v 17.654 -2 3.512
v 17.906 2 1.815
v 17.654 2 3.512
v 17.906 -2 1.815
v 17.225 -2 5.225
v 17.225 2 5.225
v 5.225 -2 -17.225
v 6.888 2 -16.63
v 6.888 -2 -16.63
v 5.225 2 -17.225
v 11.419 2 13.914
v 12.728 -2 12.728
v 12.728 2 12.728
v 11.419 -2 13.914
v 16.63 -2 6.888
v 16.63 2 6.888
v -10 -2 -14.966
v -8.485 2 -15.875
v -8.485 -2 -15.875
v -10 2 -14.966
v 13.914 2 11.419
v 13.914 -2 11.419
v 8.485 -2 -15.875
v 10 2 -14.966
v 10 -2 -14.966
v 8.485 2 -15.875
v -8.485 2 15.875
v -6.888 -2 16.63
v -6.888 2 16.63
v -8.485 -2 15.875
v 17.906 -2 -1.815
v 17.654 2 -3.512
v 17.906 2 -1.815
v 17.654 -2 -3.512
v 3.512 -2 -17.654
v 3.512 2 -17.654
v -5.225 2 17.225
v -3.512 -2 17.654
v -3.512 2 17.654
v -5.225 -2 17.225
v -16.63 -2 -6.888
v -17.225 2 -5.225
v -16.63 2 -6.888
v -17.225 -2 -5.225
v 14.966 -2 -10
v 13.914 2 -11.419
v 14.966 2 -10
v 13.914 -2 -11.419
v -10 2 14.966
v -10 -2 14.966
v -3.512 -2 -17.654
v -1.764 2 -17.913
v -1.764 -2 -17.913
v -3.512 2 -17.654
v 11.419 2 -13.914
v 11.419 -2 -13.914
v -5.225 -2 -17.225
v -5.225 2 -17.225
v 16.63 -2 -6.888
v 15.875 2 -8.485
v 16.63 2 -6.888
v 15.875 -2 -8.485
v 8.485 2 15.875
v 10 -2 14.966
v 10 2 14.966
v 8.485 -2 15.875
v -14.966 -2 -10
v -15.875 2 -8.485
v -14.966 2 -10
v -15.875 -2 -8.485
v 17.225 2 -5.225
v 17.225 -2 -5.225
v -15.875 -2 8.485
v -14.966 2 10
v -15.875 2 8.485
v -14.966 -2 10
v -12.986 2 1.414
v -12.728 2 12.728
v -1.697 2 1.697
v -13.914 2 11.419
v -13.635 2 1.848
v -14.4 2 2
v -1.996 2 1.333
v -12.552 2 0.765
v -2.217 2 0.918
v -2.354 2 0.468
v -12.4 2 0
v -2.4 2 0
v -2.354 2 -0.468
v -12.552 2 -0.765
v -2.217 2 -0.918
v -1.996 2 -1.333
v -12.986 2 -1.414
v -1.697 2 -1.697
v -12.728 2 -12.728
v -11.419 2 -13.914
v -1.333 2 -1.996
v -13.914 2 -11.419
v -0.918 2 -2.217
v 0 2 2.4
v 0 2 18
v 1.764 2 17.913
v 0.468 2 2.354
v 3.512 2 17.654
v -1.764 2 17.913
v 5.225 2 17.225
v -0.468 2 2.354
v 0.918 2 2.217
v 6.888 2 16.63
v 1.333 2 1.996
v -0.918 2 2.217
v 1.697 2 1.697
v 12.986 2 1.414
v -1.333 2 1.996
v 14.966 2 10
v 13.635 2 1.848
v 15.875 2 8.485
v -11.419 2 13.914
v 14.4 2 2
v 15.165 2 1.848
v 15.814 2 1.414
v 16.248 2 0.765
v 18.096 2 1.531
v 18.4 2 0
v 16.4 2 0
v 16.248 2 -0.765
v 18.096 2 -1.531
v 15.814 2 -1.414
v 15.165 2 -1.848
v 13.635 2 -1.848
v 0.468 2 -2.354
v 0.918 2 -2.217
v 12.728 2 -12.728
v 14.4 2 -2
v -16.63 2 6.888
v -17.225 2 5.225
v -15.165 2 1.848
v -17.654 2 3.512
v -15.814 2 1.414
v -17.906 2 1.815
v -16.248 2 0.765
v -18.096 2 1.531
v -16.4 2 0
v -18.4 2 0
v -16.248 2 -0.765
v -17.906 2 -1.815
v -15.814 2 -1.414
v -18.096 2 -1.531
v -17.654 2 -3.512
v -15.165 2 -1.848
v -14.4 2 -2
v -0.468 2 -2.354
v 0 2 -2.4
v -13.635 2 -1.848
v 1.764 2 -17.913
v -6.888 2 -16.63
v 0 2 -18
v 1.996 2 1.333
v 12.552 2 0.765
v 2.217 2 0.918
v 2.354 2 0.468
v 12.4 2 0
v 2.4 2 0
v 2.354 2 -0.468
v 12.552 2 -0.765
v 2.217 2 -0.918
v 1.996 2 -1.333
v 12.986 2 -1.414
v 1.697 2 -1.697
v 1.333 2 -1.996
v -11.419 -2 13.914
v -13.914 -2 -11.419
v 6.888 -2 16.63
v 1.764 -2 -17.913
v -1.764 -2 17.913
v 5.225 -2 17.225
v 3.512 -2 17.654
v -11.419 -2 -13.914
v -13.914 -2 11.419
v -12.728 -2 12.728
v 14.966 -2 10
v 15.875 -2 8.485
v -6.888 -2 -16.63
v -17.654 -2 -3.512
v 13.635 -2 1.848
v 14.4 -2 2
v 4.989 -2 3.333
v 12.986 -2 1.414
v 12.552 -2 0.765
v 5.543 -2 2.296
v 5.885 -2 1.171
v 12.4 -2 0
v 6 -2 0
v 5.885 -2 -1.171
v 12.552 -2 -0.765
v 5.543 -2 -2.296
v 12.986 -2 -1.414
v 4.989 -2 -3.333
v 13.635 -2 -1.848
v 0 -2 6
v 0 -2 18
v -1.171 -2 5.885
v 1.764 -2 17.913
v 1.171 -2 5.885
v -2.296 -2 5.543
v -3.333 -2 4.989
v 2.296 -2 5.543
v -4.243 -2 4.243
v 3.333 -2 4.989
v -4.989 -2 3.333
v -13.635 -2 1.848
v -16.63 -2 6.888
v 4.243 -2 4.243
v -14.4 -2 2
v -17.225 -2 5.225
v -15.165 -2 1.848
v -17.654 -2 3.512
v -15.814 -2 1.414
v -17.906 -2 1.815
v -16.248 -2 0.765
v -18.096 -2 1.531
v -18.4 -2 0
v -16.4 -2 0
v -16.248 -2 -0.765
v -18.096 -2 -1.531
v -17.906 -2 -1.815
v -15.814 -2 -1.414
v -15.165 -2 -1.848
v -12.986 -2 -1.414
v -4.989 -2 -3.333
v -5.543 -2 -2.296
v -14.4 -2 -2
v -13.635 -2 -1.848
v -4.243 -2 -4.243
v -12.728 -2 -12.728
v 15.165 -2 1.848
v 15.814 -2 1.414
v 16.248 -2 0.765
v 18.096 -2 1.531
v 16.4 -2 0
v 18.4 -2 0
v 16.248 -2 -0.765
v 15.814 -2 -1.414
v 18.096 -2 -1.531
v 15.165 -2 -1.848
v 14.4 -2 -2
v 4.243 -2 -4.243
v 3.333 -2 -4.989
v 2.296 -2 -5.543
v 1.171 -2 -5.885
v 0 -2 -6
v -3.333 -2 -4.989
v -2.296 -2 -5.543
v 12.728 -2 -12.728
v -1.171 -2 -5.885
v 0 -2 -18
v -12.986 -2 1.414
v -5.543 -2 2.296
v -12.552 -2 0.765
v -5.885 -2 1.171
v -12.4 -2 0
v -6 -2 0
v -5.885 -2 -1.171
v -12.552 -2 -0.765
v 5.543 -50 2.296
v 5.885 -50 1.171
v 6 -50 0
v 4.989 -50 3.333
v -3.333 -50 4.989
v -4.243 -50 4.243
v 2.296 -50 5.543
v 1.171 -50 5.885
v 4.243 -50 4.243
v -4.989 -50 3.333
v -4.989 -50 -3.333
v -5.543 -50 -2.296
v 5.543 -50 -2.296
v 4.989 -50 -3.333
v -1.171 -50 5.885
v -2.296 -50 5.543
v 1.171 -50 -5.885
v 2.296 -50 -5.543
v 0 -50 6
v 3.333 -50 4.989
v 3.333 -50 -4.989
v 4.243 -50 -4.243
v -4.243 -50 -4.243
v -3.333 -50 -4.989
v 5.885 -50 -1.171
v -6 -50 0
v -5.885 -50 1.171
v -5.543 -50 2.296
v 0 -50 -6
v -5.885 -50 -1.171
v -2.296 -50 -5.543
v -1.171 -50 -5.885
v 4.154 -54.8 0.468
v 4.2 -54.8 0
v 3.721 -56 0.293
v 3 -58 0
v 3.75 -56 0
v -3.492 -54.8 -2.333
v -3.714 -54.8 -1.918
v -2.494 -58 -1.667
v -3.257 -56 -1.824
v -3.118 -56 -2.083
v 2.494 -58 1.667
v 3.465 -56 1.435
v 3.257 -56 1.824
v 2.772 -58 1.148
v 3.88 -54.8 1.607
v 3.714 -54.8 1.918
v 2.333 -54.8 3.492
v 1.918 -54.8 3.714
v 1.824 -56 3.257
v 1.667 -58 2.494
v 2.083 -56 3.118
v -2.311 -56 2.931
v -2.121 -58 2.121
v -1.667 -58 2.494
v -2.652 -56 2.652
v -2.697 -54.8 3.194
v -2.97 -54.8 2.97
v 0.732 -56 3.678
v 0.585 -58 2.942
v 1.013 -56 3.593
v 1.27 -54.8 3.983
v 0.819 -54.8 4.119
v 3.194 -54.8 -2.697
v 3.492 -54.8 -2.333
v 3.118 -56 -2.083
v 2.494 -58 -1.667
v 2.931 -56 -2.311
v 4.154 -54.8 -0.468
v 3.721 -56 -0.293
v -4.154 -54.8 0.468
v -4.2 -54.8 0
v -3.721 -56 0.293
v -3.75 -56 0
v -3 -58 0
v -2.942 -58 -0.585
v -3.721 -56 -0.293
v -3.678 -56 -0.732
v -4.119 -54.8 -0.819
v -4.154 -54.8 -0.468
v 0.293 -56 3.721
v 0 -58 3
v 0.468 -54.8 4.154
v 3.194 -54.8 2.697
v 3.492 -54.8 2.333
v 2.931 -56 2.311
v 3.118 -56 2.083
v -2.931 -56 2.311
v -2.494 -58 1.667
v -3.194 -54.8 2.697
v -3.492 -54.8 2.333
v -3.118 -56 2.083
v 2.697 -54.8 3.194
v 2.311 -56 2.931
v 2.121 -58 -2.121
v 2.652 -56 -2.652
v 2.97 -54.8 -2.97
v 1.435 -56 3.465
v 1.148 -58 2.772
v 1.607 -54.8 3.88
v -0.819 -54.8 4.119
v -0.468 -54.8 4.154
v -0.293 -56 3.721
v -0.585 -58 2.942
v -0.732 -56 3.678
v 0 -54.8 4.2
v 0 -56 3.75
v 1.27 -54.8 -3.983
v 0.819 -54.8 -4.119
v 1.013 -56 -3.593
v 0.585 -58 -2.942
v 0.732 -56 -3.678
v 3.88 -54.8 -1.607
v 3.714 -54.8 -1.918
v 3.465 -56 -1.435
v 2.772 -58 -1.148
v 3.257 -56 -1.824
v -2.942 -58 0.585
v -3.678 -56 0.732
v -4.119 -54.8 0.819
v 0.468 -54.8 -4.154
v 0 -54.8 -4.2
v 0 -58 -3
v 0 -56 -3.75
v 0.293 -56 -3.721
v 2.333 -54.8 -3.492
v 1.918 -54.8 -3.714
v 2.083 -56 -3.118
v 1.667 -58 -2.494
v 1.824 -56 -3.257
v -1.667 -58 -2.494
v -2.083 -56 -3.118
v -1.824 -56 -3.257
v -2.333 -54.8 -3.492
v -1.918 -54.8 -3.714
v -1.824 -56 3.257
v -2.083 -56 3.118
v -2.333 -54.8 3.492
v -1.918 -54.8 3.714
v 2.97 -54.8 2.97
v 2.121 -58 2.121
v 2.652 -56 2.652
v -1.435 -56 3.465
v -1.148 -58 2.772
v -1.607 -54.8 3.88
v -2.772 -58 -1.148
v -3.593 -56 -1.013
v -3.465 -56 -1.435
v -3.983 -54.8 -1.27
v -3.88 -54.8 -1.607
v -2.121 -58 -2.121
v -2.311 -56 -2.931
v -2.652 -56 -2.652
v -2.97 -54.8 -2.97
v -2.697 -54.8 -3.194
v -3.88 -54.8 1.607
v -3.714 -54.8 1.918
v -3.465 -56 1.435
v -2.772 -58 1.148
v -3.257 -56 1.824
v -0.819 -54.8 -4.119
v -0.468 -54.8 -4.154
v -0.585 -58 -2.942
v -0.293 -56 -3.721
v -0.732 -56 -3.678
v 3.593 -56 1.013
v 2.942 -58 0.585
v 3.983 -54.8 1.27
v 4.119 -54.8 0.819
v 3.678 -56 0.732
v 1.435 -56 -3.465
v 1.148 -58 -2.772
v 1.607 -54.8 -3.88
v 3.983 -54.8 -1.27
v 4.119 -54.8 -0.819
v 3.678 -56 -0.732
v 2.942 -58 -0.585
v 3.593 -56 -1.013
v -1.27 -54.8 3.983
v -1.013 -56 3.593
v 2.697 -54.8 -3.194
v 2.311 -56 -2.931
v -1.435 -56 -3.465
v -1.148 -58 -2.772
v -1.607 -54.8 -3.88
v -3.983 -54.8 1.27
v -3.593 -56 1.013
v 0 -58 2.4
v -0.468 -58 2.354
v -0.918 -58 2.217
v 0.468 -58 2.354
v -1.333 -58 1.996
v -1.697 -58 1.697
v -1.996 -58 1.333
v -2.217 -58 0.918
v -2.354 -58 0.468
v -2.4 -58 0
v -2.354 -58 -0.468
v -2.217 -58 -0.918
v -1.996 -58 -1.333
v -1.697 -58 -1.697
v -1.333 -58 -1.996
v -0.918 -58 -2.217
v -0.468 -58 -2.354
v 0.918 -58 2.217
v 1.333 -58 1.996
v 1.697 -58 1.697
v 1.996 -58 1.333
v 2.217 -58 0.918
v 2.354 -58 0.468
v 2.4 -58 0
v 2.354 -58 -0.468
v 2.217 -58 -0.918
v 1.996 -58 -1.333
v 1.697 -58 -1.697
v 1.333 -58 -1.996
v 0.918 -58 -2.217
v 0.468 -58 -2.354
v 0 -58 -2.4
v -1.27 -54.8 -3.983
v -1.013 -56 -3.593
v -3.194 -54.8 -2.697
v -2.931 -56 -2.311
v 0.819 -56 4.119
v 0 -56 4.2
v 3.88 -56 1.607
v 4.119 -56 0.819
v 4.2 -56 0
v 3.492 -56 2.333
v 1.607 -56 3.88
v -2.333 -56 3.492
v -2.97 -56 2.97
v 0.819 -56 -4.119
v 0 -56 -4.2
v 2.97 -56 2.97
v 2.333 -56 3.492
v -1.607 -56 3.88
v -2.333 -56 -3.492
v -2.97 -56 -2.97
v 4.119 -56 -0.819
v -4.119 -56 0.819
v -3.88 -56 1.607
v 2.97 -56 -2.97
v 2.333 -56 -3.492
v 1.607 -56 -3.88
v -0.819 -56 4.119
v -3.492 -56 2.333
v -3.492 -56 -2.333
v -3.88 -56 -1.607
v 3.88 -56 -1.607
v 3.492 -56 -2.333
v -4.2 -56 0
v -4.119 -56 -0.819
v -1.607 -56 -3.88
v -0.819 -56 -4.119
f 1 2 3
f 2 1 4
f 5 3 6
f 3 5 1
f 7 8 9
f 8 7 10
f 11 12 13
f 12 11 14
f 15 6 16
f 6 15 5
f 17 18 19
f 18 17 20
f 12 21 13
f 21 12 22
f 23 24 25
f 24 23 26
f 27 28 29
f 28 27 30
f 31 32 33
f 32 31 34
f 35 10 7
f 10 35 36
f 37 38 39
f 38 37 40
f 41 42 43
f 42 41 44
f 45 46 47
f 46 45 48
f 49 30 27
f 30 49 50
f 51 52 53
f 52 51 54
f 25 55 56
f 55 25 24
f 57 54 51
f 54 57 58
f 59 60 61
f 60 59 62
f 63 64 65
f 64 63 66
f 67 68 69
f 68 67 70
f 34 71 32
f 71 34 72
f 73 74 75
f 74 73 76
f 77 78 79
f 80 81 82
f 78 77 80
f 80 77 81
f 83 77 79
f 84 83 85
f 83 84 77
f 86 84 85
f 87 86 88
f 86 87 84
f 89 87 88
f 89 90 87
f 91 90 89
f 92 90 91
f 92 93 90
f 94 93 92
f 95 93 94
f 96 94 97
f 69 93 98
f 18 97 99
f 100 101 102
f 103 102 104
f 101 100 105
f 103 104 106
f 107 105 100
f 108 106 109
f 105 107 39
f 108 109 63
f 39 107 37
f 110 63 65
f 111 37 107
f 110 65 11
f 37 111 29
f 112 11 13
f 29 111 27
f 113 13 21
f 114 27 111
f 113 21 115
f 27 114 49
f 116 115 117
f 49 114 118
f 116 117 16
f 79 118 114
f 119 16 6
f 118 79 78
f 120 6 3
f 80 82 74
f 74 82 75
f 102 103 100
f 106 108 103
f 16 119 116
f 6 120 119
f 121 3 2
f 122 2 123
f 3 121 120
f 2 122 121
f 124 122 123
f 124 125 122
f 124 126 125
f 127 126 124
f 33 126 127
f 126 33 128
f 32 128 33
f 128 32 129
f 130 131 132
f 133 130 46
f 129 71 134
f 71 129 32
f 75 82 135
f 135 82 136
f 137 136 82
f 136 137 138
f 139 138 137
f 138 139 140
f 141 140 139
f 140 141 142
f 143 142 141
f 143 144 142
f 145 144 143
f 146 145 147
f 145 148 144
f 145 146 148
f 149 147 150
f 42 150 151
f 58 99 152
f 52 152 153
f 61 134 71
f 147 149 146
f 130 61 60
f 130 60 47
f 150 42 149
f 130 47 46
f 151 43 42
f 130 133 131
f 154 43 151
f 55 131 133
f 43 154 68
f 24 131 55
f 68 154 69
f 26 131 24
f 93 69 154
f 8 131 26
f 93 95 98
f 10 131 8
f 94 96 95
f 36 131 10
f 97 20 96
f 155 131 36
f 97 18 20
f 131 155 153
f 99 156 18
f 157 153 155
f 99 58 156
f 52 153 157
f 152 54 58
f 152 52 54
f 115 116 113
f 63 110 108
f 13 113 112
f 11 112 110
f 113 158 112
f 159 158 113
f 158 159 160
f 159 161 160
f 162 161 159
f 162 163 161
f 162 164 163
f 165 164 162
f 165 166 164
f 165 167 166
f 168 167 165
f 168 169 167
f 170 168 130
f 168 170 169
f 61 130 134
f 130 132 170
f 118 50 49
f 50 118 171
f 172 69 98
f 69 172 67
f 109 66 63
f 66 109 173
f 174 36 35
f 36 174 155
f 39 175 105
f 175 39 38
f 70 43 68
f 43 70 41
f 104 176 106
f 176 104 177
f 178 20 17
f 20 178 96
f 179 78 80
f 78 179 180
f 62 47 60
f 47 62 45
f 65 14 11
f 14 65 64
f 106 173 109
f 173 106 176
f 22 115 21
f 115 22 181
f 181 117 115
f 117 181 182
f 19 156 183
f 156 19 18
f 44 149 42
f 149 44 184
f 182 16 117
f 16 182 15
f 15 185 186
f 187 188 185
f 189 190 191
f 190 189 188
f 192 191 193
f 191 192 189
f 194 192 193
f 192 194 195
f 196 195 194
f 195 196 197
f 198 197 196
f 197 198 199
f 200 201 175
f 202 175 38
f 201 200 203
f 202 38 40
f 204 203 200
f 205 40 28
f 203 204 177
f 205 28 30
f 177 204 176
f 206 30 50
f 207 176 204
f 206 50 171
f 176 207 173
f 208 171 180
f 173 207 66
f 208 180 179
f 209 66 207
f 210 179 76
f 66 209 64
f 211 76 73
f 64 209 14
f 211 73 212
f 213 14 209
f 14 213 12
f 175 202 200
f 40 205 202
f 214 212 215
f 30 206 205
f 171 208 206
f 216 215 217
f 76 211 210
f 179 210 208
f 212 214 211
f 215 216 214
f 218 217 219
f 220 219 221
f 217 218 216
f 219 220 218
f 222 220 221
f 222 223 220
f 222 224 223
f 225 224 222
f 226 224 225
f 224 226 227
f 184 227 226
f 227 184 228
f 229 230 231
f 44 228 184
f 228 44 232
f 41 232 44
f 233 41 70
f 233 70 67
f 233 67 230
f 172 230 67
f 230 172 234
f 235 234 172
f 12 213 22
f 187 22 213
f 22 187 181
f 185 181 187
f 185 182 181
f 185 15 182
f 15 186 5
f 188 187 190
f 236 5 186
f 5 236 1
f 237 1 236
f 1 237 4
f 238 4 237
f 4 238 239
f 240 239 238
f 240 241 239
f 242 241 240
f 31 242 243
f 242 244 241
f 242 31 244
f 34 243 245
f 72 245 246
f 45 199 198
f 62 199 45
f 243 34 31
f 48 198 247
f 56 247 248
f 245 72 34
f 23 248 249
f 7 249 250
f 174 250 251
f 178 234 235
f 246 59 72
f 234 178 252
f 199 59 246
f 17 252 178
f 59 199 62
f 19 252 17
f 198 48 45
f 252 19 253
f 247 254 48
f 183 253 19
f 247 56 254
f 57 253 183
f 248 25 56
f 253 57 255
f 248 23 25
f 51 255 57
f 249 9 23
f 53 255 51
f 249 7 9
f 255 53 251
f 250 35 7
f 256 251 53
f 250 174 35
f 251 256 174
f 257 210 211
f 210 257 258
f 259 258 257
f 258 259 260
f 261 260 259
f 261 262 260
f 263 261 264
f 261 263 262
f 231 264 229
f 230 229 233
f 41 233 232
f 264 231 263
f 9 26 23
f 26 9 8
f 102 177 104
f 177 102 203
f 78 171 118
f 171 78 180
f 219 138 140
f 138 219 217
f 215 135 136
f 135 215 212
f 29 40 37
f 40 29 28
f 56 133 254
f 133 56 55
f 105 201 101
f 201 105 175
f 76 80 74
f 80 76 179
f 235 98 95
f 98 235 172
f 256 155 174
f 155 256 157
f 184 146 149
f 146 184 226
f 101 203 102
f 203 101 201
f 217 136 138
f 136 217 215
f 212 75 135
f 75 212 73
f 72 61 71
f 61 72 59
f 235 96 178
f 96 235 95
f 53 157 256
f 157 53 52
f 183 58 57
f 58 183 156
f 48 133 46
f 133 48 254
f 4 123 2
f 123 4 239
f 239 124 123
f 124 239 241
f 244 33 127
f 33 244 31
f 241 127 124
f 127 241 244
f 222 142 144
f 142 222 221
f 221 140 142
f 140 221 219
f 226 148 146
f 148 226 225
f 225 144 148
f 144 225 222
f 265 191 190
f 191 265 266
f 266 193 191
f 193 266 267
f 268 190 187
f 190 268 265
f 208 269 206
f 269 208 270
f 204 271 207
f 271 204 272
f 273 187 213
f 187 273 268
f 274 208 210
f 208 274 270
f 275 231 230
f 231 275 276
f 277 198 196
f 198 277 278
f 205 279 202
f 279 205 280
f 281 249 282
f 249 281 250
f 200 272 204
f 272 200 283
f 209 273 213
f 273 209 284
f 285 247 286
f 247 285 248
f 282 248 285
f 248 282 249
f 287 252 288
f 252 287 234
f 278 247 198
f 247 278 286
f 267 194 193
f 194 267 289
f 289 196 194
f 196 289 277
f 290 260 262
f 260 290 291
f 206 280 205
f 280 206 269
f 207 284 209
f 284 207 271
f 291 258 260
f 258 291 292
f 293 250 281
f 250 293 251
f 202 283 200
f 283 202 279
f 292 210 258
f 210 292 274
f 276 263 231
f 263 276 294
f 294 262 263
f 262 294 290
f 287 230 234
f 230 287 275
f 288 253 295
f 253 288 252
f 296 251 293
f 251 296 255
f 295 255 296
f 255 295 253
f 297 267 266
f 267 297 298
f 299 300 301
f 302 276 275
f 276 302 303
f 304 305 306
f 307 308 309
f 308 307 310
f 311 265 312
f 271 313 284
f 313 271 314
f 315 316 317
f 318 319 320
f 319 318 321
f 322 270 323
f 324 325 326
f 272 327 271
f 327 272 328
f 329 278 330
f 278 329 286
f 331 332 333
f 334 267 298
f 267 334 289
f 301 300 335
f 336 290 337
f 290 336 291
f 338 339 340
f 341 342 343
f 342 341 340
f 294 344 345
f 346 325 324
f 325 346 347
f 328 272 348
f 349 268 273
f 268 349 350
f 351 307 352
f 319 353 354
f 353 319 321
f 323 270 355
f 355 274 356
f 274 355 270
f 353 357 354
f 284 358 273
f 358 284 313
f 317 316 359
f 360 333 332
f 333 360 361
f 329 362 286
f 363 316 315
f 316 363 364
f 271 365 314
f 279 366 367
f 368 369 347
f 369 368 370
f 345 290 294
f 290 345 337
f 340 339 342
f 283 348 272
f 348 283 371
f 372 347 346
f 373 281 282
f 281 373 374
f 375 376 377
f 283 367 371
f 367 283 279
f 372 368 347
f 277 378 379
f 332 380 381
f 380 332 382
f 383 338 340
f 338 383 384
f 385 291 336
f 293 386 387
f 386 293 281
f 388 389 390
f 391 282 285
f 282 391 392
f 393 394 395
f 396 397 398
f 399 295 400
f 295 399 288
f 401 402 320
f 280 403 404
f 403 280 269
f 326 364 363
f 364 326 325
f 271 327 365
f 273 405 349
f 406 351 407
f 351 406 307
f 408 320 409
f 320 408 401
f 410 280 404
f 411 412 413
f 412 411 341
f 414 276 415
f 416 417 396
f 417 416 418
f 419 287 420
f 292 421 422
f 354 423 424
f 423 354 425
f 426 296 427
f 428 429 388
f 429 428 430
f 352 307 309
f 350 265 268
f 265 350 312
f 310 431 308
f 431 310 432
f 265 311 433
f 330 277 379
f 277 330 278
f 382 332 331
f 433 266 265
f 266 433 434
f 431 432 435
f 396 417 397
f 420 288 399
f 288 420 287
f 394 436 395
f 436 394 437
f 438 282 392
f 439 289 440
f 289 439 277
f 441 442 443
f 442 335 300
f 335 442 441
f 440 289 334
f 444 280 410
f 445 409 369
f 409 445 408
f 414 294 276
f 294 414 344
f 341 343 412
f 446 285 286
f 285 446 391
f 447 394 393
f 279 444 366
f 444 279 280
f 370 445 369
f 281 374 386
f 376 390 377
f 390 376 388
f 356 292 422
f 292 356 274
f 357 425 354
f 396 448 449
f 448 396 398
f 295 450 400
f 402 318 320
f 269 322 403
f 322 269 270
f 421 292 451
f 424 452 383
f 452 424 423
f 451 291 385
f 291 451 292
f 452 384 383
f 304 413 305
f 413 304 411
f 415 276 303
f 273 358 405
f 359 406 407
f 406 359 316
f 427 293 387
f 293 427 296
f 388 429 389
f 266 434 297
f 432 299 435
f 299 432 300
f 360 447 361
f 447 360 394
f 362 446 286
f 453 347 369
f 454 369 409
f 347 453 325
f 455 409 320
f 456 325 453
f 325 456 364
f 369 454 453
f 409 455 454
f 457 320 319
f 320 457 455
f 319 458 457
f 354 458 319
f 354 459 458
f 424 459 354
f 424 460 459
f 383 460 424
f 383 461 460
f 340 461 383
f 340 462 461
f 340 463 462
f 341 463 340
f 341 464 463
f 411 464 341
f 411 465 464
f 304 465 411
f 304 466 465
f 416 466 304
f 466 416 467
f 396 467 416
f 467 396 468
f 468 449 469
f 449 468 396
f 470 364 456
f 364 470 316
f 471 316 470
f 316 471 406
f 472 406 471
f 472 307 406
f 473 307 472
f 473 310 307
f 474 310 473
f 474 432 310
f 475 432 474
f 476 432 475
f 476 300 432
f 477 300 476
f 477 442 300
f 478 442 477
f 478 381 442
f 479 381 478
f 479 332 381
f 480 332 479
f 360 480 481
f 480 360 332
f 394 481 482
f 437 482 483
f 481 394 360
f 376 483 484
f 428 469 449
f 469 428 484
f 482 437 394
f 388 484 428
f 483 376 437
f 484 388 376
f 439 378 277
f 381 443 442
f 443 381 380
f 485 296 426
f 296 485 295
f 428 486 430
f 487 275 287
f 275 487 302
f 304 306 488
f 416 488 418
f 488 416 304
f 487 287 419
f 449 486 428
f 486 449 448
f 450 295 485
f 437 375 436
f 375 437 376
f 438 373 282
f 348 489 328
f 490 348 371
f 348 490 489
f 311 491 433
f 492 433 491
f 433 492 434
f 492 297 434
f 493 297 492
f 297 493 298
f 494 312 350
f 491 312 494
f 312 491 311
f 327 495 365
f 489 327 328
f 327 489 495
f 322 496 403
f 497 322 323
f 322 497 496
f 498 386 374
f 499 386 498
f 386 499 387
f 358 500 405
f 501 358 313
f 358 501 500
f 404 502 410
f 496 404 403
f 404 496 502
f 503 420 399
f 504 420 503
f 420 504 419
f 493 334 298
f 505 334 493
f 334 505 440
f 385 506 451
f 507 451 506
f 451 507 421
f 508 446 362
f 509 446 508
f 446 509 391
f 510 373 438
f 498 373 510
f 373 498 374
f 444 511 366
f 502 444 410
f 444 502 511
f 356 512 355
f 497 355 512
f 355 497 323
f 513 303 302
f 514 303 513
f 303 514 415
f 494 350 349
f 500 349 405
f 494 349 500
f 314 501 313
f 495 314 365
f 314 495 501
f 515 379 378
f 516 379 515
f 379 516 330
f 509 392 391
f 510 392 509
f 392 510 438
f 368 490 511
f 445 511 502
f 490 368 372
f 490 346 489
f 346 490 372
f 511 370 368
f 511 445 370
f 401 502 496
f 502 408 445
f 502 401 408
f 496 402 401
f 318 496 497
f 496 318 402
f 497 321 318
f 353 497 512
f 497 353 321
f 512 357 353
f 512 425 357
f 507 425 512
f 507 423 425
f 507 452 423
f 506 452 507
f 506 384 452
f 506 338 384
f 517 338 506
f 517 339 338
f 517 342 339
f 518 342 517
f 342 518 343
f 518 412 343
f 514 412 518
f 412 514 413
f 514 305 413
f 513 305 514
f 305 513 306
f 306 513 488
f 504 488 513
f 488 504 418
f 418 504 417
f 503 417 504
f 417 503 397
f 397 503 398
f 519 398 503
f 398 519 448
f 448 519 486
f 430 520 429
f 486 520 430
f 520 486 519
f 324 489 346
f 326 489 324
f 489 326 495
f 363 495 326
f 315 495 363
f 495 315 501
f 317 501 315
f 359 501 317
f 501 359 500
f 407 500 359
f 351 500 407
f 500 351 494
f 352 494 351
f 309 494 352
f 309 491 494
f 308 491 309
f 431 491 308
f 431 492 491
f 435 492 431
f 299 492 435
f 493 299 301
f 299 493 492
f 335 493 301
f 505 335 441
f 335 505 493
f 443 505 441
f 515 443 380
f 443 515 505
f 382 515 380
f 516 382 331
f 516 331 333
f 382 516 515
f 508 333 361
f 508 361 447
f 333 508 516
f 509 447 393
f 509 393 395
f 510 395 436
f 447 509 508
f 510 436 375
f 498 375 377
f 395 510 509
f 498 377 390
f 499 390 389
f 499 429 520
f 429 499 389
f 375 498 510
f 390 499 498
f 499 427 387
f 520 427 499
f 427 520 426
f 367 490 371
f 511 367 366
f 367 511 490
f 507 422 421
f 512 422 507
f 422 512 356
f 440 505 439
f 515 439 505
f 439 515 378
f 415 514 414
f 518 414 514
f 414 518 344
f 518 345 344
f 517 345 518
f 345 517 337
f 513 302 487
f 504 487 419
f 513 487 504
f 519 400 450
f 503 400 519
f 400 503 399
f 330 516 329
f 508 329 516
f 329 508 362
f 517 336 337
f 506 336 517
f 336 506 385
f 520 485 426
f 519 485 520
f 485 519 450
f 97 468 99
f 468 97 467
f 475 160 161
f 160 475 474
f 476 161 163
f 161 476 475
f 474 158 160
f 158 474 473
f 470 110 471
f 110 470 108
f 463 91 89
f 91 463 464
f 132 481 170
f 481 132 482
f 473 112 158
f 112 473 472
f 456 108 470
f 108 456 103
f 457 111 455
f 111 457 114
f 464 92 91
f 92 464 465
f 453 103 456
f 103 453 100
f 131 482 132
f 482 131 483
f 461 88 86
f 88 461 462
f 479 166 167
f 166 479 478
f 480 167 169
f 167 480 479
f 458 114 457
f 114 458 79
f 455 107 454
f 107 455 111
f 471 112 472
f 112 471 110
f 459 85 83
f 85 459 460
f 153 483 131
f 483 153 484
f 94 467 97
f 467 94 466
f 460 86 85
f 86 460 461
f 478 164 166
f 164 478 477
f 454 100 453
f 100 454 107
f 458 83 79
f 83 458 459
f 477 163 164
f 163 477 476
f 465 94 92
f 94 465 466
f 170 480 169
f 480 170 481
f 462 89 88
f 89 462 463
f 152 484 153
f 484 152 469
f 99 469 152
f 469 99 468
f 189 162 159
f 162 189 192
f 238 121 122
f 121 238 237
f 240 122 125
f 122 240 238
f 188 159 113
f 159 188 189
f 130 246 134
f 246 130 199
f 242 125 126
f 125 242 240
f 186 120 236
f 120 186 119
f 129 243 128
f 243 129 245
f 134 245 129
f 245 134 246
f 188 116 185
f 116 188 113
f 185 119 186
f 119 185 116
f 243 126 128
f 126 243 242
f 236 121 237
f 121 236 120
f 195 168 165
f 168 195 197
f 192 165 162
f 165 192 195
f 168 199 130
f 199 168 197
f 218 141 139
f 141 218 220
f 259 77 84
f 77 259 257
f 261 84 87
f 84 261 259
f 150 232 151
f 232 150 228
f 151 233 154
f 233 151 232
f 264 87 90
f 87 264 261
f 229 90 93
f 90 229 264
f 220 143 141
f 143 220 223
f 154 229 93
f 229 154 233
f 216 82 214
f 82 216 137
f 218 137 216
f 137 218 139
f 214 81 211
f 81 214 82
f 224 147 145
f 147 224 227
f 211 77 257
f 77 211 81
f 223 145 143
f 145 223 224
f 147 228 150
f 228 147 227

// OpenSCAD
// file: ../utils/parametric_helpers.scad
/**
 * @file parametric_helpers.scad
 * @brief Parametric 3D Modeling Utility Library
 * @details Contains shared constants, modules, and functions for geometric arraying,
 *          rounded cylinders, and coordinate transformations.
 * 
 * Copyright (c) 2026 AEGIS-TF1 Systems Development Group.
 */

// Global Constants
PI = 3.14159265358979323846;
GOLDEN_RATIO = 1.618033988749894;
TOLERANCE = 0.05;

// Functions
function deg2rad(d) = d * PI / 180.0;
function rad2deg(r) = r * 180.0 / PI;
function lerp(a, b, t) = a + (b - a) * t;

// Modules

/**
 * @brief Distributes children shapes in a circular array
 * @param n Number of instances
 * @param radius Radius of array circle
 */
module circular_array(n, radius) {
    for (i = [0 : n - 1]) {
        angle = i * 360.0 / n;
        rotate([0, 0, angle])
        translate([radius, 0, 0])
        children();
    }
}

/**
 * @brief Distributes children shapes in a linear array along X-axis
 * @param n Number of instances
 * @param spacing Distance between instances
 */
module linear_array(n, spacing) {
    for (i = [0 : n - 1]) {
        translate([i * spacing, 0, 0])
        children();
    }
}

/**
 * @brief Hollow cylinder (tube) along Z-axis
 * @param h Tube height
 * @param outer_r Outer radius
 * @param inner_r Inner radius
 * @param fn Resolution
 */
module tube(h, outer_r, inner_r, fn=64) {
    difference() {
        cylinder(h=h, r=outer_r, center=true, $fn=fn);
        cylinder(h=h + TOLERANCE * 2.0, r=inner_r, center=true, $fn=fn);
    }
}

/**
 * @brief Torus shape centered at origin
 * @param R Major radius (ring center distance)
 * @param r Minor radius (cross section radius)
 * @param fn Resolution
 */
module torus(R, r, fn=64) {
    rotate_extrude($fn=fn)
    translate([R, 0, 0])
    circle(r=r, $fn=fn);
}

/**
 * @brief Rounded cylinder (filleted top and bottom edges) using Minkowski
 * @param h Height
 * @param r Radius
 * @param fillet_r Edge radius
 * @param fn Resolution
 */
module rounded_cylinder(h, r, fillet_r, fn=64) {
    minkowski() {
        cylinder(h = h - 2.0 * fillet_r, r = r - fillet_r, center = true, $fn = fn);
        sphere(r = fillet_r, $fn = fn);
    }
}

/**
 * @brief 2D fillet helper
 * @param r Fillet radius
 */
module fillet_2d(r) {
    difference() {
        square([r, r]);
        translate([r, r])
        circle(r=r, $fn=64);
    }
}

/**
 * @brief 2D chamfer helper
 * @param size Chamfer length
 */
module chamfer_2d(size) {
    polygon(points=[[0,0], [size,0], [0,size]]);
}

/**
 * @brief Ball bearing assembly (inner ring, outer ring, balls)
 */
module bearing_assembly(inner_dia, outer_dia, width, num_balls=10) {
    color("silver")
    difference() {
        // Outer ring
        cylinder(h=width, r=outer_dia / 2.0, center=true, $fn=64);
        cylinder(h=width + 1.0, r=(outer_dia + inner_dia)/4.0 + (outer_dia - inner_dia)/8.0 * 0.8, center=true, $fn=64);
    }
    color("silver")
    difference() {
        // Inner ring
        cylinder(h=width, r=(outer_dia + inner_dia)/4.0 - (outer_dia - inner_dia)/8.0 * 0.8, center=true, $fn=64);
        cylinder(h=width + 1.0, r=inner_dia / 2.0, center=true, $fn=64);
    }
    // Balls (arranged in circular array)
    color([0.9, 0.92, 0.95]) // Chrome steel bearing balls
    let (ball_radius = (outer_dia - inner_dia) / 8.0, pitch_radius = (outer_dia + inner_dia) / 4.0) {
        circular_array(n=num_balls, radius=pitch_radius)
        sphere(r=ball_radius * 0.95, $fn=32);
    }
}

/**
 * @brief Bolted assembly flange with hexagonal head bolts
 */
module bolted_flange(outer_r, inner_r, thickness, num_bolts=16, bolt_r=2.5) {
    color("darkgray")
    difference() {
        // Flange ring
        cylinder(h=thickness, r=outer_r, center=true, $fn=128);
        cylinder(h=thickness + 1.0, r=inner_r, center=true, $fn=128);
        
        // Bolt holes
        circular_array(n=num_bolts, radius=(outer_r + inner_r)/2.0)
        cylinder(h=thickness + 2.0, r=bolt_r, center=true, $fn=16);
    }
    // Hexagonal bolts
    color([0.72, 0.73, 0.75]) // Hardened steel zinc-plated bolts
    circular_array(n=num_bolts, radius=(outer_r + inner_r)/2.0)
    translate([0, 0, thickness/2.0])
    cylinder(h=bolt_r * 1.5, r=bolt_r * 1.6, center=false, $fn=6);
}

/**
 * @brief Dovetail slot profile shape for cutting blade roots
 */
module dovetail_slot_profile(width, height) {
    polygon(points=[
        [-width * 0.76 / 2.0, height/2.0],
        [width * 0.76 / 2.0, height/2.0],
        [width/2.0, -height/2.0],
        [-width/2.0, -height/2.0]
    ]);
}

/*
// Preview Examples
translate([0, 0, 0]) {
    // Tube example
    color("teal") tube(h=30, outer_r=15, inner_r=12);
    
    // Torus example
    translate([45, 0, 0])
    color("crimson") torus(R=20, r=4);

    // Rounded Cylinder example
    translate([-45, 0, 0])
    color([0.75, 0.65, 0.4]) rounded_cylinder(h=25, r=10, fillet_r=2.0);

    // Bearing example
    translate([0, 45, 0])
    bearing_assembly(inner_dia=20, outer_dia=40, width=12);

    // Bolted Flange example
    translate([0, -45, 0])
    bolted_flange(outer_r=30, inner_r=20, thickness=6, num_bolts=12);
}
*/
// main file
/**
 * @file fuel_injector.scad
 * @brief Fuel Injector Nozzle 3D Model
 * @details Models a duplex fuel injector with atomizing swirl vanes and mounting flange.
 * 
 * Copyright (c) 2026 AEGIS-TF1 Systems Development Group.
 */

use <../utils/parametric_helpers.scad>

/**
 * @brief Single fuel injector nozzle assembly
 * @param body_diameter Diameter of primary injector stalk (mm)
 * @param tip_diameter Atomizer nozzle tip diameter (mm)
 * @param length Stalk insertion length (mm)
 */
module fuel_injector(body_diameter=12, tip_diameter=6, length=50) {
    color([0.8, 0.82, 0.85]) // Polished steel injector body
    rotate([90, 0, 0]) // Align horizontally for insertion mapping
    difference() {
        union() {
            // 1. Mounting Flange
            cylinder(h=4, r=body_diameter * 1.5, center=true, $fn=64);
            
            // Flange bolt ears
            translate([body_diameter * 1.2, 0, 0])
            cylinder(h=4, r=4, center=true, $fn=16);
            translate([-body_diameter * 1.2, 0, 0])
            cylinder(h=4, r=4, center=true, $fn=16);

            // 2. Injector Stalk Body
            translate([0, 0, length / 2.0])
            cylinder(h=length, r=body_diameter / 2.0, center=true, $fn=32);

            // 3. Tapered Nozzle Tip
            translate([0, 0, length])
            cylinder(h=8, r1=body_diameter / 2.0, r2=tip_diameter / 2.0, center=false, $fn=32);
            
            // Swirl Vane housing ring at tip
            translate([0, 0, length + 4])
            cylinder(h=4, r=body_diameter * 0.7 / 2.0, center=true, $fn=32);
        }

        // 4. Internal fuel feed gallery (hollow path)
        translate([0, 0, -2])
        cylinder(h=length + 10, r=body_diameter * 0.4 / 2.0, center=false, $fn=32);

        // Flange bolt holes
        translate([body_diameter * 1.2, 0, 0])
        cylinder(h=10, r=2, center=true, $fn=16);
        translate([-body_diameter * 1.2, 0, 0])
        cylinder(h=10, r=2, center=true, $fn=16);
    }
}

// Preview
fuel_injector();
